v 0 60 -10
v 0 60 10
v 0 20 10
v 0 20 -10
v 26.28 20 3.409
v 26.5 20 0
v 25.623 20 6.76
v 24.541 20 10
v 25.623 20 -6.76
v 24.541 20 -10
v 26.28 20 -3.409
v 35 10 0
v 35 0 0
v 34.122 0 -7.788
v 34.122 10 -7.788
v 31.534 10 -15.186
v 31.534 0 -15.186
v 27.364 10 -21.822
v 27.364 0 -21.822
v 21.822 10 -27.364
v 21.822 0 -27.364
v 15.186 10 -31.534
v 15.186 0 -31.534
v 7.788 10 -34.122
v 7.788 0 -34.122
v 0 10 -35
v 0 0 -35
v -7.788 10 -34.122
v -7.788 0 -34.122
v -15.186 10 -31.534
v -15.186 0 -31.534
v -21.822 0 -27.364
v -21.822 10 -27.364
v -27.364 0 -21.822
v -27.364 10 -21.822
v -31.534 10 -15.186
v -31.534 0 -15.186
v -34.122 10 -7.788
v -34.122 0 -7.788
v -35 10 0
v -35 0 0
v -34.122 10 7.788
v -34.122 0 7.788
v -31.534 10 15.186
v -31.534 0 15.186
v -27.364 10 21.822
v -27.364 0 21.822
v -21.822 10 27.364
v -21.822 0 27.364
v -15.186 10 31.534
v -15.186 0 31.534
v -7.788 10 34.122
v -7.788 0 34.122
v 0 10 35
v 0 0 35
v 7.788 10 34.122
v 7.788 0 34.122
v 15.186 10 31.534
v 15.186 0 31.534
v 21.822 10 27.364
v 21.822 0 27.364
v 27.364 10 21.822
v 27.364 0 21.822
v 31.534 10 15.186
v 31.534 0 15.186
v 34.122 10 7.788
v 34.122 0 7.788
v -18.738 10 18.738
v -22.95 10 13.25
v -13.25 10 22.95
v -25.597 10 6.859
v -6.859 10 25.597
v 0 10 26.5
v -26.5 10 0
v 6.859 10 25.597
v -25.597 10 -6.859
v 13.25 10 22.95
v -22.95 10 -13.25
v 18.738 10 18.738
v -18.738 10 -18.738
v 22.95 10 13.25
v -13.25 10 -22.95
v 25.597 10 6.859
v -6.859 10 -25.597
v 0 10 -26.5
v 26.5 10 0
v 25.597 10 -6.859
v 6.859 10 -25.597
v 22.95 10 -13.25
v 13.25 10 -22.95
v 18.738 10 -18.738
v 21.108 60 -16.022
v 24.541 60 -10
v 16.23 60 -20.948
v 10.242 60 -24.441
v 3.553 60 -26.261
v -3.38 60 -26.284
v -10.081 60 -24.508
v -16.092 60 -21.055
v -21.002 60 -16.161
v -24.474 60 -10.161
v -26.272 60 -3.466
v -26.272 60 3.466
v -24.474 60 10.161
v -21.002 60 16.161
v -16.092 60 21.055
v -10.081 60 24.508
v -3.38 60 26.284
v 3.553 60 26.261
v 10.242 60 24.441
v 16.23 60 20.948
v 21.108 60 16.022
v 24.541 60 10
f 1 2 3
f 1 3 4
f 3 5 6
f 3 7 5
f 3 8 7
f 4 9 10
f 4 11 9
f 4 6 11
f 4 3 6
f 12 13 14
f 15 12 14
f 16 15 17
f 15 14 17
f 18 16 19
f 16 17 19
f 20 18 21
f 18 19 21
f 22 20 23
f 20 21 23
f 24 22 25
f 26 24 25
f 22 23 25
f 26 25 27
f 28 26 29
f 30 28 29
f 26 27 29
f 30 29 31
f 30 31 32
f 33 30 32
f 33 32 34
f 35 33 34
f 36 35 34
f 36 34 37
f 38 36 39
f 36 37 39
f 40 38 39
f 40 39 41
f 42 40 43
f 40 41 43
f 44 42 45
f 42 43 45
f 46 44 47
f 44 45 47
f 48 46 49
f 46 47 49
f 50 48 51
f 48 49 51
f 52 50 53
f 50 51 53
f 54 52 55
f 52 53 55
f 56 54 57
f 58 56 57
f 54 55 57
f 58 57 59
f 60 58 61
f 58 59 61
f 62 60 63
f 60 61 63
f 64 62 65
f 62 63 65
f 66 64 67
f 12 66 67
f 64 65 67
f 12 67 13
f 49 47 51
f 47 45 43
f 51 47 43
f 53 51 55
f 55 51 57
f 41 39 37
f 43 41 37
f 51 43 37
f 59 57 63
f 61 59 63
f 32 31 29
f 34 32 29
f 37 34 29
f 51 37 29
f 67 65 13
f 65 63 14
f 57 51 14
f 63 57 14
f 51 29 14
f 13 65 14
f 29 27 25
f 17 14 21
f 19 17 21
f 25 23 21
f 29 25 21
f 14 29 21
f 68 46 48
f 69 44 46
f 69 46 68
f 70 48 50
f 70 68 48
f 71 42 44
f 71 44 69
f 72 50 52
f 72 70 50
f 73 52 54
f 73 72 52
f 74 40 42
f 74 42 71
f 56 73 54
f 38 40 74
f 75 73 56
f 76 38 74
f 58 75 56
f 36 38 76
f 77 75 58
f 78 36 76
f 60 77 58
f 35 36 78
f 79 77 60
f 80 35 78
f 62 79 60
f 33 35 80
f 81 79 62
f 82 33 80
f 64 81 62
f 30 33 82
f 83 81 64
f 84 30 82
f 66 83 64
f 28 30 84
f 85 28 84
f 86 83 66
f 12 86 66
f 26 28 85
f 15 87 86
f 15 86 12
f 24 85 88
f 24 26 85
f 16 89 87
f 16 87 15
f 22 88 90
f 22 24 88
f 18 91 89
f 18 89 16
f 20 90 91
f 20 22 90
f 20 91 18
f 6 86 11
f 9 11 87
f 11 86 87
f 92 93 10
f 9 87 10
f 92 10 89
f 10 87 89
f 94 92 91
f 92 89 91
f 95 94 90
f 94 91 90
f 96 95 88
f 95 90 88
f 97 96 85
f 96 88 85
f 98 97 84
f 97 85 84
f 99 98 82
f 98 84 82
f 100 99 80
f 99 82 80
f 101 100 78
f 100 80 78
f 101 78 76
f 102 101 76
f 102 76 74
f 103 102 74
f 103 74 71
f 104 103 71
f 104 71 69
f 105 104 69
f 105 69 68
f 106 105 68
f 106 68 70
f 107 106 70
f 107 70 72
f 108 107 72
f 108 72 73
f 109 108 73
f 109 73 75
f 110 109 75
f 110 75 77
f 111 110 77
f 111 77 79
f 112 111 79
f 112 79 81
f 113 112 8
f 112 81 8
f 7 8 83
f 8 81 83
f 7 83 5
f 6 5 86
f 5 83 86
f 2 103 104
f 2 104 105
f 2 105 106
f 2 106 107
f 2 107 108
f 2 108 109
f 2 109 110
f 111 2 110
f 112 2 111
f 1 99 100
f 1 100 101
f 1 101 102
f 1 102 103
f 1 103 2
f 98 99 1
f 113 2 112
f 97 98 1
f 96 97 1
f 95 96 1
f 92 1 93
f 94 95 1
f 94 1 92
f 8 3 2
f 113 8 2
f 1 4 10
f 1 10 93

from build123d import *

# Parameters (mm, degrees)
CROQUIS1_R              = 35
SALIENTE_EXTRUIR1_DEPTH = 10
CROQUIS2_R              = 26.5
SALIENTE_EXTRUIR3_DEPTH = 50
CROQUIS4_W              = 20
CROQUIS4_H              = 40
CORTAR_EXTRUIR2_DEPTH   = 40


with BuildPart() as part:
    # Croquis1 → Saliente-Extruir1 (new body)
    with BuildSketch(Plane(origin=(0, 0, 0), x_dir=(1, 0, 0), z_dir=(0, 1, 0))):
        Circle(CROQUIS1_R)
    extrude(amount=SALIENTE_EXTRUIR1_DEPTH)

    # Croquis2 → Saliente-Extruir3 (add)
    with BuildSketch(Plane(origin=(0, 10, 0), x_dir=(1, 0, 0), z_dir=(0, 1, 0))):
        Circle(CROQUIS2_R)
    extrude(amount=SALIENTE_EXTRUIR3_DEPTH)

    # Croquis4 → Cortar-Extruir2 (cut)
    with BuildSketch(Plane(origin=(0, 0, 0), x_dir=(0, 0, -1), z_dir=(1, 0, 0))):
        with Locations((0, 40)):
            Rectangle(CROQUIS4_W, CROQUIS4_H)
    extrude(amount=CORTAR_EXTRUIR2_DEPTH, mode=Mode.SUBTRACT)


solid = part.part
